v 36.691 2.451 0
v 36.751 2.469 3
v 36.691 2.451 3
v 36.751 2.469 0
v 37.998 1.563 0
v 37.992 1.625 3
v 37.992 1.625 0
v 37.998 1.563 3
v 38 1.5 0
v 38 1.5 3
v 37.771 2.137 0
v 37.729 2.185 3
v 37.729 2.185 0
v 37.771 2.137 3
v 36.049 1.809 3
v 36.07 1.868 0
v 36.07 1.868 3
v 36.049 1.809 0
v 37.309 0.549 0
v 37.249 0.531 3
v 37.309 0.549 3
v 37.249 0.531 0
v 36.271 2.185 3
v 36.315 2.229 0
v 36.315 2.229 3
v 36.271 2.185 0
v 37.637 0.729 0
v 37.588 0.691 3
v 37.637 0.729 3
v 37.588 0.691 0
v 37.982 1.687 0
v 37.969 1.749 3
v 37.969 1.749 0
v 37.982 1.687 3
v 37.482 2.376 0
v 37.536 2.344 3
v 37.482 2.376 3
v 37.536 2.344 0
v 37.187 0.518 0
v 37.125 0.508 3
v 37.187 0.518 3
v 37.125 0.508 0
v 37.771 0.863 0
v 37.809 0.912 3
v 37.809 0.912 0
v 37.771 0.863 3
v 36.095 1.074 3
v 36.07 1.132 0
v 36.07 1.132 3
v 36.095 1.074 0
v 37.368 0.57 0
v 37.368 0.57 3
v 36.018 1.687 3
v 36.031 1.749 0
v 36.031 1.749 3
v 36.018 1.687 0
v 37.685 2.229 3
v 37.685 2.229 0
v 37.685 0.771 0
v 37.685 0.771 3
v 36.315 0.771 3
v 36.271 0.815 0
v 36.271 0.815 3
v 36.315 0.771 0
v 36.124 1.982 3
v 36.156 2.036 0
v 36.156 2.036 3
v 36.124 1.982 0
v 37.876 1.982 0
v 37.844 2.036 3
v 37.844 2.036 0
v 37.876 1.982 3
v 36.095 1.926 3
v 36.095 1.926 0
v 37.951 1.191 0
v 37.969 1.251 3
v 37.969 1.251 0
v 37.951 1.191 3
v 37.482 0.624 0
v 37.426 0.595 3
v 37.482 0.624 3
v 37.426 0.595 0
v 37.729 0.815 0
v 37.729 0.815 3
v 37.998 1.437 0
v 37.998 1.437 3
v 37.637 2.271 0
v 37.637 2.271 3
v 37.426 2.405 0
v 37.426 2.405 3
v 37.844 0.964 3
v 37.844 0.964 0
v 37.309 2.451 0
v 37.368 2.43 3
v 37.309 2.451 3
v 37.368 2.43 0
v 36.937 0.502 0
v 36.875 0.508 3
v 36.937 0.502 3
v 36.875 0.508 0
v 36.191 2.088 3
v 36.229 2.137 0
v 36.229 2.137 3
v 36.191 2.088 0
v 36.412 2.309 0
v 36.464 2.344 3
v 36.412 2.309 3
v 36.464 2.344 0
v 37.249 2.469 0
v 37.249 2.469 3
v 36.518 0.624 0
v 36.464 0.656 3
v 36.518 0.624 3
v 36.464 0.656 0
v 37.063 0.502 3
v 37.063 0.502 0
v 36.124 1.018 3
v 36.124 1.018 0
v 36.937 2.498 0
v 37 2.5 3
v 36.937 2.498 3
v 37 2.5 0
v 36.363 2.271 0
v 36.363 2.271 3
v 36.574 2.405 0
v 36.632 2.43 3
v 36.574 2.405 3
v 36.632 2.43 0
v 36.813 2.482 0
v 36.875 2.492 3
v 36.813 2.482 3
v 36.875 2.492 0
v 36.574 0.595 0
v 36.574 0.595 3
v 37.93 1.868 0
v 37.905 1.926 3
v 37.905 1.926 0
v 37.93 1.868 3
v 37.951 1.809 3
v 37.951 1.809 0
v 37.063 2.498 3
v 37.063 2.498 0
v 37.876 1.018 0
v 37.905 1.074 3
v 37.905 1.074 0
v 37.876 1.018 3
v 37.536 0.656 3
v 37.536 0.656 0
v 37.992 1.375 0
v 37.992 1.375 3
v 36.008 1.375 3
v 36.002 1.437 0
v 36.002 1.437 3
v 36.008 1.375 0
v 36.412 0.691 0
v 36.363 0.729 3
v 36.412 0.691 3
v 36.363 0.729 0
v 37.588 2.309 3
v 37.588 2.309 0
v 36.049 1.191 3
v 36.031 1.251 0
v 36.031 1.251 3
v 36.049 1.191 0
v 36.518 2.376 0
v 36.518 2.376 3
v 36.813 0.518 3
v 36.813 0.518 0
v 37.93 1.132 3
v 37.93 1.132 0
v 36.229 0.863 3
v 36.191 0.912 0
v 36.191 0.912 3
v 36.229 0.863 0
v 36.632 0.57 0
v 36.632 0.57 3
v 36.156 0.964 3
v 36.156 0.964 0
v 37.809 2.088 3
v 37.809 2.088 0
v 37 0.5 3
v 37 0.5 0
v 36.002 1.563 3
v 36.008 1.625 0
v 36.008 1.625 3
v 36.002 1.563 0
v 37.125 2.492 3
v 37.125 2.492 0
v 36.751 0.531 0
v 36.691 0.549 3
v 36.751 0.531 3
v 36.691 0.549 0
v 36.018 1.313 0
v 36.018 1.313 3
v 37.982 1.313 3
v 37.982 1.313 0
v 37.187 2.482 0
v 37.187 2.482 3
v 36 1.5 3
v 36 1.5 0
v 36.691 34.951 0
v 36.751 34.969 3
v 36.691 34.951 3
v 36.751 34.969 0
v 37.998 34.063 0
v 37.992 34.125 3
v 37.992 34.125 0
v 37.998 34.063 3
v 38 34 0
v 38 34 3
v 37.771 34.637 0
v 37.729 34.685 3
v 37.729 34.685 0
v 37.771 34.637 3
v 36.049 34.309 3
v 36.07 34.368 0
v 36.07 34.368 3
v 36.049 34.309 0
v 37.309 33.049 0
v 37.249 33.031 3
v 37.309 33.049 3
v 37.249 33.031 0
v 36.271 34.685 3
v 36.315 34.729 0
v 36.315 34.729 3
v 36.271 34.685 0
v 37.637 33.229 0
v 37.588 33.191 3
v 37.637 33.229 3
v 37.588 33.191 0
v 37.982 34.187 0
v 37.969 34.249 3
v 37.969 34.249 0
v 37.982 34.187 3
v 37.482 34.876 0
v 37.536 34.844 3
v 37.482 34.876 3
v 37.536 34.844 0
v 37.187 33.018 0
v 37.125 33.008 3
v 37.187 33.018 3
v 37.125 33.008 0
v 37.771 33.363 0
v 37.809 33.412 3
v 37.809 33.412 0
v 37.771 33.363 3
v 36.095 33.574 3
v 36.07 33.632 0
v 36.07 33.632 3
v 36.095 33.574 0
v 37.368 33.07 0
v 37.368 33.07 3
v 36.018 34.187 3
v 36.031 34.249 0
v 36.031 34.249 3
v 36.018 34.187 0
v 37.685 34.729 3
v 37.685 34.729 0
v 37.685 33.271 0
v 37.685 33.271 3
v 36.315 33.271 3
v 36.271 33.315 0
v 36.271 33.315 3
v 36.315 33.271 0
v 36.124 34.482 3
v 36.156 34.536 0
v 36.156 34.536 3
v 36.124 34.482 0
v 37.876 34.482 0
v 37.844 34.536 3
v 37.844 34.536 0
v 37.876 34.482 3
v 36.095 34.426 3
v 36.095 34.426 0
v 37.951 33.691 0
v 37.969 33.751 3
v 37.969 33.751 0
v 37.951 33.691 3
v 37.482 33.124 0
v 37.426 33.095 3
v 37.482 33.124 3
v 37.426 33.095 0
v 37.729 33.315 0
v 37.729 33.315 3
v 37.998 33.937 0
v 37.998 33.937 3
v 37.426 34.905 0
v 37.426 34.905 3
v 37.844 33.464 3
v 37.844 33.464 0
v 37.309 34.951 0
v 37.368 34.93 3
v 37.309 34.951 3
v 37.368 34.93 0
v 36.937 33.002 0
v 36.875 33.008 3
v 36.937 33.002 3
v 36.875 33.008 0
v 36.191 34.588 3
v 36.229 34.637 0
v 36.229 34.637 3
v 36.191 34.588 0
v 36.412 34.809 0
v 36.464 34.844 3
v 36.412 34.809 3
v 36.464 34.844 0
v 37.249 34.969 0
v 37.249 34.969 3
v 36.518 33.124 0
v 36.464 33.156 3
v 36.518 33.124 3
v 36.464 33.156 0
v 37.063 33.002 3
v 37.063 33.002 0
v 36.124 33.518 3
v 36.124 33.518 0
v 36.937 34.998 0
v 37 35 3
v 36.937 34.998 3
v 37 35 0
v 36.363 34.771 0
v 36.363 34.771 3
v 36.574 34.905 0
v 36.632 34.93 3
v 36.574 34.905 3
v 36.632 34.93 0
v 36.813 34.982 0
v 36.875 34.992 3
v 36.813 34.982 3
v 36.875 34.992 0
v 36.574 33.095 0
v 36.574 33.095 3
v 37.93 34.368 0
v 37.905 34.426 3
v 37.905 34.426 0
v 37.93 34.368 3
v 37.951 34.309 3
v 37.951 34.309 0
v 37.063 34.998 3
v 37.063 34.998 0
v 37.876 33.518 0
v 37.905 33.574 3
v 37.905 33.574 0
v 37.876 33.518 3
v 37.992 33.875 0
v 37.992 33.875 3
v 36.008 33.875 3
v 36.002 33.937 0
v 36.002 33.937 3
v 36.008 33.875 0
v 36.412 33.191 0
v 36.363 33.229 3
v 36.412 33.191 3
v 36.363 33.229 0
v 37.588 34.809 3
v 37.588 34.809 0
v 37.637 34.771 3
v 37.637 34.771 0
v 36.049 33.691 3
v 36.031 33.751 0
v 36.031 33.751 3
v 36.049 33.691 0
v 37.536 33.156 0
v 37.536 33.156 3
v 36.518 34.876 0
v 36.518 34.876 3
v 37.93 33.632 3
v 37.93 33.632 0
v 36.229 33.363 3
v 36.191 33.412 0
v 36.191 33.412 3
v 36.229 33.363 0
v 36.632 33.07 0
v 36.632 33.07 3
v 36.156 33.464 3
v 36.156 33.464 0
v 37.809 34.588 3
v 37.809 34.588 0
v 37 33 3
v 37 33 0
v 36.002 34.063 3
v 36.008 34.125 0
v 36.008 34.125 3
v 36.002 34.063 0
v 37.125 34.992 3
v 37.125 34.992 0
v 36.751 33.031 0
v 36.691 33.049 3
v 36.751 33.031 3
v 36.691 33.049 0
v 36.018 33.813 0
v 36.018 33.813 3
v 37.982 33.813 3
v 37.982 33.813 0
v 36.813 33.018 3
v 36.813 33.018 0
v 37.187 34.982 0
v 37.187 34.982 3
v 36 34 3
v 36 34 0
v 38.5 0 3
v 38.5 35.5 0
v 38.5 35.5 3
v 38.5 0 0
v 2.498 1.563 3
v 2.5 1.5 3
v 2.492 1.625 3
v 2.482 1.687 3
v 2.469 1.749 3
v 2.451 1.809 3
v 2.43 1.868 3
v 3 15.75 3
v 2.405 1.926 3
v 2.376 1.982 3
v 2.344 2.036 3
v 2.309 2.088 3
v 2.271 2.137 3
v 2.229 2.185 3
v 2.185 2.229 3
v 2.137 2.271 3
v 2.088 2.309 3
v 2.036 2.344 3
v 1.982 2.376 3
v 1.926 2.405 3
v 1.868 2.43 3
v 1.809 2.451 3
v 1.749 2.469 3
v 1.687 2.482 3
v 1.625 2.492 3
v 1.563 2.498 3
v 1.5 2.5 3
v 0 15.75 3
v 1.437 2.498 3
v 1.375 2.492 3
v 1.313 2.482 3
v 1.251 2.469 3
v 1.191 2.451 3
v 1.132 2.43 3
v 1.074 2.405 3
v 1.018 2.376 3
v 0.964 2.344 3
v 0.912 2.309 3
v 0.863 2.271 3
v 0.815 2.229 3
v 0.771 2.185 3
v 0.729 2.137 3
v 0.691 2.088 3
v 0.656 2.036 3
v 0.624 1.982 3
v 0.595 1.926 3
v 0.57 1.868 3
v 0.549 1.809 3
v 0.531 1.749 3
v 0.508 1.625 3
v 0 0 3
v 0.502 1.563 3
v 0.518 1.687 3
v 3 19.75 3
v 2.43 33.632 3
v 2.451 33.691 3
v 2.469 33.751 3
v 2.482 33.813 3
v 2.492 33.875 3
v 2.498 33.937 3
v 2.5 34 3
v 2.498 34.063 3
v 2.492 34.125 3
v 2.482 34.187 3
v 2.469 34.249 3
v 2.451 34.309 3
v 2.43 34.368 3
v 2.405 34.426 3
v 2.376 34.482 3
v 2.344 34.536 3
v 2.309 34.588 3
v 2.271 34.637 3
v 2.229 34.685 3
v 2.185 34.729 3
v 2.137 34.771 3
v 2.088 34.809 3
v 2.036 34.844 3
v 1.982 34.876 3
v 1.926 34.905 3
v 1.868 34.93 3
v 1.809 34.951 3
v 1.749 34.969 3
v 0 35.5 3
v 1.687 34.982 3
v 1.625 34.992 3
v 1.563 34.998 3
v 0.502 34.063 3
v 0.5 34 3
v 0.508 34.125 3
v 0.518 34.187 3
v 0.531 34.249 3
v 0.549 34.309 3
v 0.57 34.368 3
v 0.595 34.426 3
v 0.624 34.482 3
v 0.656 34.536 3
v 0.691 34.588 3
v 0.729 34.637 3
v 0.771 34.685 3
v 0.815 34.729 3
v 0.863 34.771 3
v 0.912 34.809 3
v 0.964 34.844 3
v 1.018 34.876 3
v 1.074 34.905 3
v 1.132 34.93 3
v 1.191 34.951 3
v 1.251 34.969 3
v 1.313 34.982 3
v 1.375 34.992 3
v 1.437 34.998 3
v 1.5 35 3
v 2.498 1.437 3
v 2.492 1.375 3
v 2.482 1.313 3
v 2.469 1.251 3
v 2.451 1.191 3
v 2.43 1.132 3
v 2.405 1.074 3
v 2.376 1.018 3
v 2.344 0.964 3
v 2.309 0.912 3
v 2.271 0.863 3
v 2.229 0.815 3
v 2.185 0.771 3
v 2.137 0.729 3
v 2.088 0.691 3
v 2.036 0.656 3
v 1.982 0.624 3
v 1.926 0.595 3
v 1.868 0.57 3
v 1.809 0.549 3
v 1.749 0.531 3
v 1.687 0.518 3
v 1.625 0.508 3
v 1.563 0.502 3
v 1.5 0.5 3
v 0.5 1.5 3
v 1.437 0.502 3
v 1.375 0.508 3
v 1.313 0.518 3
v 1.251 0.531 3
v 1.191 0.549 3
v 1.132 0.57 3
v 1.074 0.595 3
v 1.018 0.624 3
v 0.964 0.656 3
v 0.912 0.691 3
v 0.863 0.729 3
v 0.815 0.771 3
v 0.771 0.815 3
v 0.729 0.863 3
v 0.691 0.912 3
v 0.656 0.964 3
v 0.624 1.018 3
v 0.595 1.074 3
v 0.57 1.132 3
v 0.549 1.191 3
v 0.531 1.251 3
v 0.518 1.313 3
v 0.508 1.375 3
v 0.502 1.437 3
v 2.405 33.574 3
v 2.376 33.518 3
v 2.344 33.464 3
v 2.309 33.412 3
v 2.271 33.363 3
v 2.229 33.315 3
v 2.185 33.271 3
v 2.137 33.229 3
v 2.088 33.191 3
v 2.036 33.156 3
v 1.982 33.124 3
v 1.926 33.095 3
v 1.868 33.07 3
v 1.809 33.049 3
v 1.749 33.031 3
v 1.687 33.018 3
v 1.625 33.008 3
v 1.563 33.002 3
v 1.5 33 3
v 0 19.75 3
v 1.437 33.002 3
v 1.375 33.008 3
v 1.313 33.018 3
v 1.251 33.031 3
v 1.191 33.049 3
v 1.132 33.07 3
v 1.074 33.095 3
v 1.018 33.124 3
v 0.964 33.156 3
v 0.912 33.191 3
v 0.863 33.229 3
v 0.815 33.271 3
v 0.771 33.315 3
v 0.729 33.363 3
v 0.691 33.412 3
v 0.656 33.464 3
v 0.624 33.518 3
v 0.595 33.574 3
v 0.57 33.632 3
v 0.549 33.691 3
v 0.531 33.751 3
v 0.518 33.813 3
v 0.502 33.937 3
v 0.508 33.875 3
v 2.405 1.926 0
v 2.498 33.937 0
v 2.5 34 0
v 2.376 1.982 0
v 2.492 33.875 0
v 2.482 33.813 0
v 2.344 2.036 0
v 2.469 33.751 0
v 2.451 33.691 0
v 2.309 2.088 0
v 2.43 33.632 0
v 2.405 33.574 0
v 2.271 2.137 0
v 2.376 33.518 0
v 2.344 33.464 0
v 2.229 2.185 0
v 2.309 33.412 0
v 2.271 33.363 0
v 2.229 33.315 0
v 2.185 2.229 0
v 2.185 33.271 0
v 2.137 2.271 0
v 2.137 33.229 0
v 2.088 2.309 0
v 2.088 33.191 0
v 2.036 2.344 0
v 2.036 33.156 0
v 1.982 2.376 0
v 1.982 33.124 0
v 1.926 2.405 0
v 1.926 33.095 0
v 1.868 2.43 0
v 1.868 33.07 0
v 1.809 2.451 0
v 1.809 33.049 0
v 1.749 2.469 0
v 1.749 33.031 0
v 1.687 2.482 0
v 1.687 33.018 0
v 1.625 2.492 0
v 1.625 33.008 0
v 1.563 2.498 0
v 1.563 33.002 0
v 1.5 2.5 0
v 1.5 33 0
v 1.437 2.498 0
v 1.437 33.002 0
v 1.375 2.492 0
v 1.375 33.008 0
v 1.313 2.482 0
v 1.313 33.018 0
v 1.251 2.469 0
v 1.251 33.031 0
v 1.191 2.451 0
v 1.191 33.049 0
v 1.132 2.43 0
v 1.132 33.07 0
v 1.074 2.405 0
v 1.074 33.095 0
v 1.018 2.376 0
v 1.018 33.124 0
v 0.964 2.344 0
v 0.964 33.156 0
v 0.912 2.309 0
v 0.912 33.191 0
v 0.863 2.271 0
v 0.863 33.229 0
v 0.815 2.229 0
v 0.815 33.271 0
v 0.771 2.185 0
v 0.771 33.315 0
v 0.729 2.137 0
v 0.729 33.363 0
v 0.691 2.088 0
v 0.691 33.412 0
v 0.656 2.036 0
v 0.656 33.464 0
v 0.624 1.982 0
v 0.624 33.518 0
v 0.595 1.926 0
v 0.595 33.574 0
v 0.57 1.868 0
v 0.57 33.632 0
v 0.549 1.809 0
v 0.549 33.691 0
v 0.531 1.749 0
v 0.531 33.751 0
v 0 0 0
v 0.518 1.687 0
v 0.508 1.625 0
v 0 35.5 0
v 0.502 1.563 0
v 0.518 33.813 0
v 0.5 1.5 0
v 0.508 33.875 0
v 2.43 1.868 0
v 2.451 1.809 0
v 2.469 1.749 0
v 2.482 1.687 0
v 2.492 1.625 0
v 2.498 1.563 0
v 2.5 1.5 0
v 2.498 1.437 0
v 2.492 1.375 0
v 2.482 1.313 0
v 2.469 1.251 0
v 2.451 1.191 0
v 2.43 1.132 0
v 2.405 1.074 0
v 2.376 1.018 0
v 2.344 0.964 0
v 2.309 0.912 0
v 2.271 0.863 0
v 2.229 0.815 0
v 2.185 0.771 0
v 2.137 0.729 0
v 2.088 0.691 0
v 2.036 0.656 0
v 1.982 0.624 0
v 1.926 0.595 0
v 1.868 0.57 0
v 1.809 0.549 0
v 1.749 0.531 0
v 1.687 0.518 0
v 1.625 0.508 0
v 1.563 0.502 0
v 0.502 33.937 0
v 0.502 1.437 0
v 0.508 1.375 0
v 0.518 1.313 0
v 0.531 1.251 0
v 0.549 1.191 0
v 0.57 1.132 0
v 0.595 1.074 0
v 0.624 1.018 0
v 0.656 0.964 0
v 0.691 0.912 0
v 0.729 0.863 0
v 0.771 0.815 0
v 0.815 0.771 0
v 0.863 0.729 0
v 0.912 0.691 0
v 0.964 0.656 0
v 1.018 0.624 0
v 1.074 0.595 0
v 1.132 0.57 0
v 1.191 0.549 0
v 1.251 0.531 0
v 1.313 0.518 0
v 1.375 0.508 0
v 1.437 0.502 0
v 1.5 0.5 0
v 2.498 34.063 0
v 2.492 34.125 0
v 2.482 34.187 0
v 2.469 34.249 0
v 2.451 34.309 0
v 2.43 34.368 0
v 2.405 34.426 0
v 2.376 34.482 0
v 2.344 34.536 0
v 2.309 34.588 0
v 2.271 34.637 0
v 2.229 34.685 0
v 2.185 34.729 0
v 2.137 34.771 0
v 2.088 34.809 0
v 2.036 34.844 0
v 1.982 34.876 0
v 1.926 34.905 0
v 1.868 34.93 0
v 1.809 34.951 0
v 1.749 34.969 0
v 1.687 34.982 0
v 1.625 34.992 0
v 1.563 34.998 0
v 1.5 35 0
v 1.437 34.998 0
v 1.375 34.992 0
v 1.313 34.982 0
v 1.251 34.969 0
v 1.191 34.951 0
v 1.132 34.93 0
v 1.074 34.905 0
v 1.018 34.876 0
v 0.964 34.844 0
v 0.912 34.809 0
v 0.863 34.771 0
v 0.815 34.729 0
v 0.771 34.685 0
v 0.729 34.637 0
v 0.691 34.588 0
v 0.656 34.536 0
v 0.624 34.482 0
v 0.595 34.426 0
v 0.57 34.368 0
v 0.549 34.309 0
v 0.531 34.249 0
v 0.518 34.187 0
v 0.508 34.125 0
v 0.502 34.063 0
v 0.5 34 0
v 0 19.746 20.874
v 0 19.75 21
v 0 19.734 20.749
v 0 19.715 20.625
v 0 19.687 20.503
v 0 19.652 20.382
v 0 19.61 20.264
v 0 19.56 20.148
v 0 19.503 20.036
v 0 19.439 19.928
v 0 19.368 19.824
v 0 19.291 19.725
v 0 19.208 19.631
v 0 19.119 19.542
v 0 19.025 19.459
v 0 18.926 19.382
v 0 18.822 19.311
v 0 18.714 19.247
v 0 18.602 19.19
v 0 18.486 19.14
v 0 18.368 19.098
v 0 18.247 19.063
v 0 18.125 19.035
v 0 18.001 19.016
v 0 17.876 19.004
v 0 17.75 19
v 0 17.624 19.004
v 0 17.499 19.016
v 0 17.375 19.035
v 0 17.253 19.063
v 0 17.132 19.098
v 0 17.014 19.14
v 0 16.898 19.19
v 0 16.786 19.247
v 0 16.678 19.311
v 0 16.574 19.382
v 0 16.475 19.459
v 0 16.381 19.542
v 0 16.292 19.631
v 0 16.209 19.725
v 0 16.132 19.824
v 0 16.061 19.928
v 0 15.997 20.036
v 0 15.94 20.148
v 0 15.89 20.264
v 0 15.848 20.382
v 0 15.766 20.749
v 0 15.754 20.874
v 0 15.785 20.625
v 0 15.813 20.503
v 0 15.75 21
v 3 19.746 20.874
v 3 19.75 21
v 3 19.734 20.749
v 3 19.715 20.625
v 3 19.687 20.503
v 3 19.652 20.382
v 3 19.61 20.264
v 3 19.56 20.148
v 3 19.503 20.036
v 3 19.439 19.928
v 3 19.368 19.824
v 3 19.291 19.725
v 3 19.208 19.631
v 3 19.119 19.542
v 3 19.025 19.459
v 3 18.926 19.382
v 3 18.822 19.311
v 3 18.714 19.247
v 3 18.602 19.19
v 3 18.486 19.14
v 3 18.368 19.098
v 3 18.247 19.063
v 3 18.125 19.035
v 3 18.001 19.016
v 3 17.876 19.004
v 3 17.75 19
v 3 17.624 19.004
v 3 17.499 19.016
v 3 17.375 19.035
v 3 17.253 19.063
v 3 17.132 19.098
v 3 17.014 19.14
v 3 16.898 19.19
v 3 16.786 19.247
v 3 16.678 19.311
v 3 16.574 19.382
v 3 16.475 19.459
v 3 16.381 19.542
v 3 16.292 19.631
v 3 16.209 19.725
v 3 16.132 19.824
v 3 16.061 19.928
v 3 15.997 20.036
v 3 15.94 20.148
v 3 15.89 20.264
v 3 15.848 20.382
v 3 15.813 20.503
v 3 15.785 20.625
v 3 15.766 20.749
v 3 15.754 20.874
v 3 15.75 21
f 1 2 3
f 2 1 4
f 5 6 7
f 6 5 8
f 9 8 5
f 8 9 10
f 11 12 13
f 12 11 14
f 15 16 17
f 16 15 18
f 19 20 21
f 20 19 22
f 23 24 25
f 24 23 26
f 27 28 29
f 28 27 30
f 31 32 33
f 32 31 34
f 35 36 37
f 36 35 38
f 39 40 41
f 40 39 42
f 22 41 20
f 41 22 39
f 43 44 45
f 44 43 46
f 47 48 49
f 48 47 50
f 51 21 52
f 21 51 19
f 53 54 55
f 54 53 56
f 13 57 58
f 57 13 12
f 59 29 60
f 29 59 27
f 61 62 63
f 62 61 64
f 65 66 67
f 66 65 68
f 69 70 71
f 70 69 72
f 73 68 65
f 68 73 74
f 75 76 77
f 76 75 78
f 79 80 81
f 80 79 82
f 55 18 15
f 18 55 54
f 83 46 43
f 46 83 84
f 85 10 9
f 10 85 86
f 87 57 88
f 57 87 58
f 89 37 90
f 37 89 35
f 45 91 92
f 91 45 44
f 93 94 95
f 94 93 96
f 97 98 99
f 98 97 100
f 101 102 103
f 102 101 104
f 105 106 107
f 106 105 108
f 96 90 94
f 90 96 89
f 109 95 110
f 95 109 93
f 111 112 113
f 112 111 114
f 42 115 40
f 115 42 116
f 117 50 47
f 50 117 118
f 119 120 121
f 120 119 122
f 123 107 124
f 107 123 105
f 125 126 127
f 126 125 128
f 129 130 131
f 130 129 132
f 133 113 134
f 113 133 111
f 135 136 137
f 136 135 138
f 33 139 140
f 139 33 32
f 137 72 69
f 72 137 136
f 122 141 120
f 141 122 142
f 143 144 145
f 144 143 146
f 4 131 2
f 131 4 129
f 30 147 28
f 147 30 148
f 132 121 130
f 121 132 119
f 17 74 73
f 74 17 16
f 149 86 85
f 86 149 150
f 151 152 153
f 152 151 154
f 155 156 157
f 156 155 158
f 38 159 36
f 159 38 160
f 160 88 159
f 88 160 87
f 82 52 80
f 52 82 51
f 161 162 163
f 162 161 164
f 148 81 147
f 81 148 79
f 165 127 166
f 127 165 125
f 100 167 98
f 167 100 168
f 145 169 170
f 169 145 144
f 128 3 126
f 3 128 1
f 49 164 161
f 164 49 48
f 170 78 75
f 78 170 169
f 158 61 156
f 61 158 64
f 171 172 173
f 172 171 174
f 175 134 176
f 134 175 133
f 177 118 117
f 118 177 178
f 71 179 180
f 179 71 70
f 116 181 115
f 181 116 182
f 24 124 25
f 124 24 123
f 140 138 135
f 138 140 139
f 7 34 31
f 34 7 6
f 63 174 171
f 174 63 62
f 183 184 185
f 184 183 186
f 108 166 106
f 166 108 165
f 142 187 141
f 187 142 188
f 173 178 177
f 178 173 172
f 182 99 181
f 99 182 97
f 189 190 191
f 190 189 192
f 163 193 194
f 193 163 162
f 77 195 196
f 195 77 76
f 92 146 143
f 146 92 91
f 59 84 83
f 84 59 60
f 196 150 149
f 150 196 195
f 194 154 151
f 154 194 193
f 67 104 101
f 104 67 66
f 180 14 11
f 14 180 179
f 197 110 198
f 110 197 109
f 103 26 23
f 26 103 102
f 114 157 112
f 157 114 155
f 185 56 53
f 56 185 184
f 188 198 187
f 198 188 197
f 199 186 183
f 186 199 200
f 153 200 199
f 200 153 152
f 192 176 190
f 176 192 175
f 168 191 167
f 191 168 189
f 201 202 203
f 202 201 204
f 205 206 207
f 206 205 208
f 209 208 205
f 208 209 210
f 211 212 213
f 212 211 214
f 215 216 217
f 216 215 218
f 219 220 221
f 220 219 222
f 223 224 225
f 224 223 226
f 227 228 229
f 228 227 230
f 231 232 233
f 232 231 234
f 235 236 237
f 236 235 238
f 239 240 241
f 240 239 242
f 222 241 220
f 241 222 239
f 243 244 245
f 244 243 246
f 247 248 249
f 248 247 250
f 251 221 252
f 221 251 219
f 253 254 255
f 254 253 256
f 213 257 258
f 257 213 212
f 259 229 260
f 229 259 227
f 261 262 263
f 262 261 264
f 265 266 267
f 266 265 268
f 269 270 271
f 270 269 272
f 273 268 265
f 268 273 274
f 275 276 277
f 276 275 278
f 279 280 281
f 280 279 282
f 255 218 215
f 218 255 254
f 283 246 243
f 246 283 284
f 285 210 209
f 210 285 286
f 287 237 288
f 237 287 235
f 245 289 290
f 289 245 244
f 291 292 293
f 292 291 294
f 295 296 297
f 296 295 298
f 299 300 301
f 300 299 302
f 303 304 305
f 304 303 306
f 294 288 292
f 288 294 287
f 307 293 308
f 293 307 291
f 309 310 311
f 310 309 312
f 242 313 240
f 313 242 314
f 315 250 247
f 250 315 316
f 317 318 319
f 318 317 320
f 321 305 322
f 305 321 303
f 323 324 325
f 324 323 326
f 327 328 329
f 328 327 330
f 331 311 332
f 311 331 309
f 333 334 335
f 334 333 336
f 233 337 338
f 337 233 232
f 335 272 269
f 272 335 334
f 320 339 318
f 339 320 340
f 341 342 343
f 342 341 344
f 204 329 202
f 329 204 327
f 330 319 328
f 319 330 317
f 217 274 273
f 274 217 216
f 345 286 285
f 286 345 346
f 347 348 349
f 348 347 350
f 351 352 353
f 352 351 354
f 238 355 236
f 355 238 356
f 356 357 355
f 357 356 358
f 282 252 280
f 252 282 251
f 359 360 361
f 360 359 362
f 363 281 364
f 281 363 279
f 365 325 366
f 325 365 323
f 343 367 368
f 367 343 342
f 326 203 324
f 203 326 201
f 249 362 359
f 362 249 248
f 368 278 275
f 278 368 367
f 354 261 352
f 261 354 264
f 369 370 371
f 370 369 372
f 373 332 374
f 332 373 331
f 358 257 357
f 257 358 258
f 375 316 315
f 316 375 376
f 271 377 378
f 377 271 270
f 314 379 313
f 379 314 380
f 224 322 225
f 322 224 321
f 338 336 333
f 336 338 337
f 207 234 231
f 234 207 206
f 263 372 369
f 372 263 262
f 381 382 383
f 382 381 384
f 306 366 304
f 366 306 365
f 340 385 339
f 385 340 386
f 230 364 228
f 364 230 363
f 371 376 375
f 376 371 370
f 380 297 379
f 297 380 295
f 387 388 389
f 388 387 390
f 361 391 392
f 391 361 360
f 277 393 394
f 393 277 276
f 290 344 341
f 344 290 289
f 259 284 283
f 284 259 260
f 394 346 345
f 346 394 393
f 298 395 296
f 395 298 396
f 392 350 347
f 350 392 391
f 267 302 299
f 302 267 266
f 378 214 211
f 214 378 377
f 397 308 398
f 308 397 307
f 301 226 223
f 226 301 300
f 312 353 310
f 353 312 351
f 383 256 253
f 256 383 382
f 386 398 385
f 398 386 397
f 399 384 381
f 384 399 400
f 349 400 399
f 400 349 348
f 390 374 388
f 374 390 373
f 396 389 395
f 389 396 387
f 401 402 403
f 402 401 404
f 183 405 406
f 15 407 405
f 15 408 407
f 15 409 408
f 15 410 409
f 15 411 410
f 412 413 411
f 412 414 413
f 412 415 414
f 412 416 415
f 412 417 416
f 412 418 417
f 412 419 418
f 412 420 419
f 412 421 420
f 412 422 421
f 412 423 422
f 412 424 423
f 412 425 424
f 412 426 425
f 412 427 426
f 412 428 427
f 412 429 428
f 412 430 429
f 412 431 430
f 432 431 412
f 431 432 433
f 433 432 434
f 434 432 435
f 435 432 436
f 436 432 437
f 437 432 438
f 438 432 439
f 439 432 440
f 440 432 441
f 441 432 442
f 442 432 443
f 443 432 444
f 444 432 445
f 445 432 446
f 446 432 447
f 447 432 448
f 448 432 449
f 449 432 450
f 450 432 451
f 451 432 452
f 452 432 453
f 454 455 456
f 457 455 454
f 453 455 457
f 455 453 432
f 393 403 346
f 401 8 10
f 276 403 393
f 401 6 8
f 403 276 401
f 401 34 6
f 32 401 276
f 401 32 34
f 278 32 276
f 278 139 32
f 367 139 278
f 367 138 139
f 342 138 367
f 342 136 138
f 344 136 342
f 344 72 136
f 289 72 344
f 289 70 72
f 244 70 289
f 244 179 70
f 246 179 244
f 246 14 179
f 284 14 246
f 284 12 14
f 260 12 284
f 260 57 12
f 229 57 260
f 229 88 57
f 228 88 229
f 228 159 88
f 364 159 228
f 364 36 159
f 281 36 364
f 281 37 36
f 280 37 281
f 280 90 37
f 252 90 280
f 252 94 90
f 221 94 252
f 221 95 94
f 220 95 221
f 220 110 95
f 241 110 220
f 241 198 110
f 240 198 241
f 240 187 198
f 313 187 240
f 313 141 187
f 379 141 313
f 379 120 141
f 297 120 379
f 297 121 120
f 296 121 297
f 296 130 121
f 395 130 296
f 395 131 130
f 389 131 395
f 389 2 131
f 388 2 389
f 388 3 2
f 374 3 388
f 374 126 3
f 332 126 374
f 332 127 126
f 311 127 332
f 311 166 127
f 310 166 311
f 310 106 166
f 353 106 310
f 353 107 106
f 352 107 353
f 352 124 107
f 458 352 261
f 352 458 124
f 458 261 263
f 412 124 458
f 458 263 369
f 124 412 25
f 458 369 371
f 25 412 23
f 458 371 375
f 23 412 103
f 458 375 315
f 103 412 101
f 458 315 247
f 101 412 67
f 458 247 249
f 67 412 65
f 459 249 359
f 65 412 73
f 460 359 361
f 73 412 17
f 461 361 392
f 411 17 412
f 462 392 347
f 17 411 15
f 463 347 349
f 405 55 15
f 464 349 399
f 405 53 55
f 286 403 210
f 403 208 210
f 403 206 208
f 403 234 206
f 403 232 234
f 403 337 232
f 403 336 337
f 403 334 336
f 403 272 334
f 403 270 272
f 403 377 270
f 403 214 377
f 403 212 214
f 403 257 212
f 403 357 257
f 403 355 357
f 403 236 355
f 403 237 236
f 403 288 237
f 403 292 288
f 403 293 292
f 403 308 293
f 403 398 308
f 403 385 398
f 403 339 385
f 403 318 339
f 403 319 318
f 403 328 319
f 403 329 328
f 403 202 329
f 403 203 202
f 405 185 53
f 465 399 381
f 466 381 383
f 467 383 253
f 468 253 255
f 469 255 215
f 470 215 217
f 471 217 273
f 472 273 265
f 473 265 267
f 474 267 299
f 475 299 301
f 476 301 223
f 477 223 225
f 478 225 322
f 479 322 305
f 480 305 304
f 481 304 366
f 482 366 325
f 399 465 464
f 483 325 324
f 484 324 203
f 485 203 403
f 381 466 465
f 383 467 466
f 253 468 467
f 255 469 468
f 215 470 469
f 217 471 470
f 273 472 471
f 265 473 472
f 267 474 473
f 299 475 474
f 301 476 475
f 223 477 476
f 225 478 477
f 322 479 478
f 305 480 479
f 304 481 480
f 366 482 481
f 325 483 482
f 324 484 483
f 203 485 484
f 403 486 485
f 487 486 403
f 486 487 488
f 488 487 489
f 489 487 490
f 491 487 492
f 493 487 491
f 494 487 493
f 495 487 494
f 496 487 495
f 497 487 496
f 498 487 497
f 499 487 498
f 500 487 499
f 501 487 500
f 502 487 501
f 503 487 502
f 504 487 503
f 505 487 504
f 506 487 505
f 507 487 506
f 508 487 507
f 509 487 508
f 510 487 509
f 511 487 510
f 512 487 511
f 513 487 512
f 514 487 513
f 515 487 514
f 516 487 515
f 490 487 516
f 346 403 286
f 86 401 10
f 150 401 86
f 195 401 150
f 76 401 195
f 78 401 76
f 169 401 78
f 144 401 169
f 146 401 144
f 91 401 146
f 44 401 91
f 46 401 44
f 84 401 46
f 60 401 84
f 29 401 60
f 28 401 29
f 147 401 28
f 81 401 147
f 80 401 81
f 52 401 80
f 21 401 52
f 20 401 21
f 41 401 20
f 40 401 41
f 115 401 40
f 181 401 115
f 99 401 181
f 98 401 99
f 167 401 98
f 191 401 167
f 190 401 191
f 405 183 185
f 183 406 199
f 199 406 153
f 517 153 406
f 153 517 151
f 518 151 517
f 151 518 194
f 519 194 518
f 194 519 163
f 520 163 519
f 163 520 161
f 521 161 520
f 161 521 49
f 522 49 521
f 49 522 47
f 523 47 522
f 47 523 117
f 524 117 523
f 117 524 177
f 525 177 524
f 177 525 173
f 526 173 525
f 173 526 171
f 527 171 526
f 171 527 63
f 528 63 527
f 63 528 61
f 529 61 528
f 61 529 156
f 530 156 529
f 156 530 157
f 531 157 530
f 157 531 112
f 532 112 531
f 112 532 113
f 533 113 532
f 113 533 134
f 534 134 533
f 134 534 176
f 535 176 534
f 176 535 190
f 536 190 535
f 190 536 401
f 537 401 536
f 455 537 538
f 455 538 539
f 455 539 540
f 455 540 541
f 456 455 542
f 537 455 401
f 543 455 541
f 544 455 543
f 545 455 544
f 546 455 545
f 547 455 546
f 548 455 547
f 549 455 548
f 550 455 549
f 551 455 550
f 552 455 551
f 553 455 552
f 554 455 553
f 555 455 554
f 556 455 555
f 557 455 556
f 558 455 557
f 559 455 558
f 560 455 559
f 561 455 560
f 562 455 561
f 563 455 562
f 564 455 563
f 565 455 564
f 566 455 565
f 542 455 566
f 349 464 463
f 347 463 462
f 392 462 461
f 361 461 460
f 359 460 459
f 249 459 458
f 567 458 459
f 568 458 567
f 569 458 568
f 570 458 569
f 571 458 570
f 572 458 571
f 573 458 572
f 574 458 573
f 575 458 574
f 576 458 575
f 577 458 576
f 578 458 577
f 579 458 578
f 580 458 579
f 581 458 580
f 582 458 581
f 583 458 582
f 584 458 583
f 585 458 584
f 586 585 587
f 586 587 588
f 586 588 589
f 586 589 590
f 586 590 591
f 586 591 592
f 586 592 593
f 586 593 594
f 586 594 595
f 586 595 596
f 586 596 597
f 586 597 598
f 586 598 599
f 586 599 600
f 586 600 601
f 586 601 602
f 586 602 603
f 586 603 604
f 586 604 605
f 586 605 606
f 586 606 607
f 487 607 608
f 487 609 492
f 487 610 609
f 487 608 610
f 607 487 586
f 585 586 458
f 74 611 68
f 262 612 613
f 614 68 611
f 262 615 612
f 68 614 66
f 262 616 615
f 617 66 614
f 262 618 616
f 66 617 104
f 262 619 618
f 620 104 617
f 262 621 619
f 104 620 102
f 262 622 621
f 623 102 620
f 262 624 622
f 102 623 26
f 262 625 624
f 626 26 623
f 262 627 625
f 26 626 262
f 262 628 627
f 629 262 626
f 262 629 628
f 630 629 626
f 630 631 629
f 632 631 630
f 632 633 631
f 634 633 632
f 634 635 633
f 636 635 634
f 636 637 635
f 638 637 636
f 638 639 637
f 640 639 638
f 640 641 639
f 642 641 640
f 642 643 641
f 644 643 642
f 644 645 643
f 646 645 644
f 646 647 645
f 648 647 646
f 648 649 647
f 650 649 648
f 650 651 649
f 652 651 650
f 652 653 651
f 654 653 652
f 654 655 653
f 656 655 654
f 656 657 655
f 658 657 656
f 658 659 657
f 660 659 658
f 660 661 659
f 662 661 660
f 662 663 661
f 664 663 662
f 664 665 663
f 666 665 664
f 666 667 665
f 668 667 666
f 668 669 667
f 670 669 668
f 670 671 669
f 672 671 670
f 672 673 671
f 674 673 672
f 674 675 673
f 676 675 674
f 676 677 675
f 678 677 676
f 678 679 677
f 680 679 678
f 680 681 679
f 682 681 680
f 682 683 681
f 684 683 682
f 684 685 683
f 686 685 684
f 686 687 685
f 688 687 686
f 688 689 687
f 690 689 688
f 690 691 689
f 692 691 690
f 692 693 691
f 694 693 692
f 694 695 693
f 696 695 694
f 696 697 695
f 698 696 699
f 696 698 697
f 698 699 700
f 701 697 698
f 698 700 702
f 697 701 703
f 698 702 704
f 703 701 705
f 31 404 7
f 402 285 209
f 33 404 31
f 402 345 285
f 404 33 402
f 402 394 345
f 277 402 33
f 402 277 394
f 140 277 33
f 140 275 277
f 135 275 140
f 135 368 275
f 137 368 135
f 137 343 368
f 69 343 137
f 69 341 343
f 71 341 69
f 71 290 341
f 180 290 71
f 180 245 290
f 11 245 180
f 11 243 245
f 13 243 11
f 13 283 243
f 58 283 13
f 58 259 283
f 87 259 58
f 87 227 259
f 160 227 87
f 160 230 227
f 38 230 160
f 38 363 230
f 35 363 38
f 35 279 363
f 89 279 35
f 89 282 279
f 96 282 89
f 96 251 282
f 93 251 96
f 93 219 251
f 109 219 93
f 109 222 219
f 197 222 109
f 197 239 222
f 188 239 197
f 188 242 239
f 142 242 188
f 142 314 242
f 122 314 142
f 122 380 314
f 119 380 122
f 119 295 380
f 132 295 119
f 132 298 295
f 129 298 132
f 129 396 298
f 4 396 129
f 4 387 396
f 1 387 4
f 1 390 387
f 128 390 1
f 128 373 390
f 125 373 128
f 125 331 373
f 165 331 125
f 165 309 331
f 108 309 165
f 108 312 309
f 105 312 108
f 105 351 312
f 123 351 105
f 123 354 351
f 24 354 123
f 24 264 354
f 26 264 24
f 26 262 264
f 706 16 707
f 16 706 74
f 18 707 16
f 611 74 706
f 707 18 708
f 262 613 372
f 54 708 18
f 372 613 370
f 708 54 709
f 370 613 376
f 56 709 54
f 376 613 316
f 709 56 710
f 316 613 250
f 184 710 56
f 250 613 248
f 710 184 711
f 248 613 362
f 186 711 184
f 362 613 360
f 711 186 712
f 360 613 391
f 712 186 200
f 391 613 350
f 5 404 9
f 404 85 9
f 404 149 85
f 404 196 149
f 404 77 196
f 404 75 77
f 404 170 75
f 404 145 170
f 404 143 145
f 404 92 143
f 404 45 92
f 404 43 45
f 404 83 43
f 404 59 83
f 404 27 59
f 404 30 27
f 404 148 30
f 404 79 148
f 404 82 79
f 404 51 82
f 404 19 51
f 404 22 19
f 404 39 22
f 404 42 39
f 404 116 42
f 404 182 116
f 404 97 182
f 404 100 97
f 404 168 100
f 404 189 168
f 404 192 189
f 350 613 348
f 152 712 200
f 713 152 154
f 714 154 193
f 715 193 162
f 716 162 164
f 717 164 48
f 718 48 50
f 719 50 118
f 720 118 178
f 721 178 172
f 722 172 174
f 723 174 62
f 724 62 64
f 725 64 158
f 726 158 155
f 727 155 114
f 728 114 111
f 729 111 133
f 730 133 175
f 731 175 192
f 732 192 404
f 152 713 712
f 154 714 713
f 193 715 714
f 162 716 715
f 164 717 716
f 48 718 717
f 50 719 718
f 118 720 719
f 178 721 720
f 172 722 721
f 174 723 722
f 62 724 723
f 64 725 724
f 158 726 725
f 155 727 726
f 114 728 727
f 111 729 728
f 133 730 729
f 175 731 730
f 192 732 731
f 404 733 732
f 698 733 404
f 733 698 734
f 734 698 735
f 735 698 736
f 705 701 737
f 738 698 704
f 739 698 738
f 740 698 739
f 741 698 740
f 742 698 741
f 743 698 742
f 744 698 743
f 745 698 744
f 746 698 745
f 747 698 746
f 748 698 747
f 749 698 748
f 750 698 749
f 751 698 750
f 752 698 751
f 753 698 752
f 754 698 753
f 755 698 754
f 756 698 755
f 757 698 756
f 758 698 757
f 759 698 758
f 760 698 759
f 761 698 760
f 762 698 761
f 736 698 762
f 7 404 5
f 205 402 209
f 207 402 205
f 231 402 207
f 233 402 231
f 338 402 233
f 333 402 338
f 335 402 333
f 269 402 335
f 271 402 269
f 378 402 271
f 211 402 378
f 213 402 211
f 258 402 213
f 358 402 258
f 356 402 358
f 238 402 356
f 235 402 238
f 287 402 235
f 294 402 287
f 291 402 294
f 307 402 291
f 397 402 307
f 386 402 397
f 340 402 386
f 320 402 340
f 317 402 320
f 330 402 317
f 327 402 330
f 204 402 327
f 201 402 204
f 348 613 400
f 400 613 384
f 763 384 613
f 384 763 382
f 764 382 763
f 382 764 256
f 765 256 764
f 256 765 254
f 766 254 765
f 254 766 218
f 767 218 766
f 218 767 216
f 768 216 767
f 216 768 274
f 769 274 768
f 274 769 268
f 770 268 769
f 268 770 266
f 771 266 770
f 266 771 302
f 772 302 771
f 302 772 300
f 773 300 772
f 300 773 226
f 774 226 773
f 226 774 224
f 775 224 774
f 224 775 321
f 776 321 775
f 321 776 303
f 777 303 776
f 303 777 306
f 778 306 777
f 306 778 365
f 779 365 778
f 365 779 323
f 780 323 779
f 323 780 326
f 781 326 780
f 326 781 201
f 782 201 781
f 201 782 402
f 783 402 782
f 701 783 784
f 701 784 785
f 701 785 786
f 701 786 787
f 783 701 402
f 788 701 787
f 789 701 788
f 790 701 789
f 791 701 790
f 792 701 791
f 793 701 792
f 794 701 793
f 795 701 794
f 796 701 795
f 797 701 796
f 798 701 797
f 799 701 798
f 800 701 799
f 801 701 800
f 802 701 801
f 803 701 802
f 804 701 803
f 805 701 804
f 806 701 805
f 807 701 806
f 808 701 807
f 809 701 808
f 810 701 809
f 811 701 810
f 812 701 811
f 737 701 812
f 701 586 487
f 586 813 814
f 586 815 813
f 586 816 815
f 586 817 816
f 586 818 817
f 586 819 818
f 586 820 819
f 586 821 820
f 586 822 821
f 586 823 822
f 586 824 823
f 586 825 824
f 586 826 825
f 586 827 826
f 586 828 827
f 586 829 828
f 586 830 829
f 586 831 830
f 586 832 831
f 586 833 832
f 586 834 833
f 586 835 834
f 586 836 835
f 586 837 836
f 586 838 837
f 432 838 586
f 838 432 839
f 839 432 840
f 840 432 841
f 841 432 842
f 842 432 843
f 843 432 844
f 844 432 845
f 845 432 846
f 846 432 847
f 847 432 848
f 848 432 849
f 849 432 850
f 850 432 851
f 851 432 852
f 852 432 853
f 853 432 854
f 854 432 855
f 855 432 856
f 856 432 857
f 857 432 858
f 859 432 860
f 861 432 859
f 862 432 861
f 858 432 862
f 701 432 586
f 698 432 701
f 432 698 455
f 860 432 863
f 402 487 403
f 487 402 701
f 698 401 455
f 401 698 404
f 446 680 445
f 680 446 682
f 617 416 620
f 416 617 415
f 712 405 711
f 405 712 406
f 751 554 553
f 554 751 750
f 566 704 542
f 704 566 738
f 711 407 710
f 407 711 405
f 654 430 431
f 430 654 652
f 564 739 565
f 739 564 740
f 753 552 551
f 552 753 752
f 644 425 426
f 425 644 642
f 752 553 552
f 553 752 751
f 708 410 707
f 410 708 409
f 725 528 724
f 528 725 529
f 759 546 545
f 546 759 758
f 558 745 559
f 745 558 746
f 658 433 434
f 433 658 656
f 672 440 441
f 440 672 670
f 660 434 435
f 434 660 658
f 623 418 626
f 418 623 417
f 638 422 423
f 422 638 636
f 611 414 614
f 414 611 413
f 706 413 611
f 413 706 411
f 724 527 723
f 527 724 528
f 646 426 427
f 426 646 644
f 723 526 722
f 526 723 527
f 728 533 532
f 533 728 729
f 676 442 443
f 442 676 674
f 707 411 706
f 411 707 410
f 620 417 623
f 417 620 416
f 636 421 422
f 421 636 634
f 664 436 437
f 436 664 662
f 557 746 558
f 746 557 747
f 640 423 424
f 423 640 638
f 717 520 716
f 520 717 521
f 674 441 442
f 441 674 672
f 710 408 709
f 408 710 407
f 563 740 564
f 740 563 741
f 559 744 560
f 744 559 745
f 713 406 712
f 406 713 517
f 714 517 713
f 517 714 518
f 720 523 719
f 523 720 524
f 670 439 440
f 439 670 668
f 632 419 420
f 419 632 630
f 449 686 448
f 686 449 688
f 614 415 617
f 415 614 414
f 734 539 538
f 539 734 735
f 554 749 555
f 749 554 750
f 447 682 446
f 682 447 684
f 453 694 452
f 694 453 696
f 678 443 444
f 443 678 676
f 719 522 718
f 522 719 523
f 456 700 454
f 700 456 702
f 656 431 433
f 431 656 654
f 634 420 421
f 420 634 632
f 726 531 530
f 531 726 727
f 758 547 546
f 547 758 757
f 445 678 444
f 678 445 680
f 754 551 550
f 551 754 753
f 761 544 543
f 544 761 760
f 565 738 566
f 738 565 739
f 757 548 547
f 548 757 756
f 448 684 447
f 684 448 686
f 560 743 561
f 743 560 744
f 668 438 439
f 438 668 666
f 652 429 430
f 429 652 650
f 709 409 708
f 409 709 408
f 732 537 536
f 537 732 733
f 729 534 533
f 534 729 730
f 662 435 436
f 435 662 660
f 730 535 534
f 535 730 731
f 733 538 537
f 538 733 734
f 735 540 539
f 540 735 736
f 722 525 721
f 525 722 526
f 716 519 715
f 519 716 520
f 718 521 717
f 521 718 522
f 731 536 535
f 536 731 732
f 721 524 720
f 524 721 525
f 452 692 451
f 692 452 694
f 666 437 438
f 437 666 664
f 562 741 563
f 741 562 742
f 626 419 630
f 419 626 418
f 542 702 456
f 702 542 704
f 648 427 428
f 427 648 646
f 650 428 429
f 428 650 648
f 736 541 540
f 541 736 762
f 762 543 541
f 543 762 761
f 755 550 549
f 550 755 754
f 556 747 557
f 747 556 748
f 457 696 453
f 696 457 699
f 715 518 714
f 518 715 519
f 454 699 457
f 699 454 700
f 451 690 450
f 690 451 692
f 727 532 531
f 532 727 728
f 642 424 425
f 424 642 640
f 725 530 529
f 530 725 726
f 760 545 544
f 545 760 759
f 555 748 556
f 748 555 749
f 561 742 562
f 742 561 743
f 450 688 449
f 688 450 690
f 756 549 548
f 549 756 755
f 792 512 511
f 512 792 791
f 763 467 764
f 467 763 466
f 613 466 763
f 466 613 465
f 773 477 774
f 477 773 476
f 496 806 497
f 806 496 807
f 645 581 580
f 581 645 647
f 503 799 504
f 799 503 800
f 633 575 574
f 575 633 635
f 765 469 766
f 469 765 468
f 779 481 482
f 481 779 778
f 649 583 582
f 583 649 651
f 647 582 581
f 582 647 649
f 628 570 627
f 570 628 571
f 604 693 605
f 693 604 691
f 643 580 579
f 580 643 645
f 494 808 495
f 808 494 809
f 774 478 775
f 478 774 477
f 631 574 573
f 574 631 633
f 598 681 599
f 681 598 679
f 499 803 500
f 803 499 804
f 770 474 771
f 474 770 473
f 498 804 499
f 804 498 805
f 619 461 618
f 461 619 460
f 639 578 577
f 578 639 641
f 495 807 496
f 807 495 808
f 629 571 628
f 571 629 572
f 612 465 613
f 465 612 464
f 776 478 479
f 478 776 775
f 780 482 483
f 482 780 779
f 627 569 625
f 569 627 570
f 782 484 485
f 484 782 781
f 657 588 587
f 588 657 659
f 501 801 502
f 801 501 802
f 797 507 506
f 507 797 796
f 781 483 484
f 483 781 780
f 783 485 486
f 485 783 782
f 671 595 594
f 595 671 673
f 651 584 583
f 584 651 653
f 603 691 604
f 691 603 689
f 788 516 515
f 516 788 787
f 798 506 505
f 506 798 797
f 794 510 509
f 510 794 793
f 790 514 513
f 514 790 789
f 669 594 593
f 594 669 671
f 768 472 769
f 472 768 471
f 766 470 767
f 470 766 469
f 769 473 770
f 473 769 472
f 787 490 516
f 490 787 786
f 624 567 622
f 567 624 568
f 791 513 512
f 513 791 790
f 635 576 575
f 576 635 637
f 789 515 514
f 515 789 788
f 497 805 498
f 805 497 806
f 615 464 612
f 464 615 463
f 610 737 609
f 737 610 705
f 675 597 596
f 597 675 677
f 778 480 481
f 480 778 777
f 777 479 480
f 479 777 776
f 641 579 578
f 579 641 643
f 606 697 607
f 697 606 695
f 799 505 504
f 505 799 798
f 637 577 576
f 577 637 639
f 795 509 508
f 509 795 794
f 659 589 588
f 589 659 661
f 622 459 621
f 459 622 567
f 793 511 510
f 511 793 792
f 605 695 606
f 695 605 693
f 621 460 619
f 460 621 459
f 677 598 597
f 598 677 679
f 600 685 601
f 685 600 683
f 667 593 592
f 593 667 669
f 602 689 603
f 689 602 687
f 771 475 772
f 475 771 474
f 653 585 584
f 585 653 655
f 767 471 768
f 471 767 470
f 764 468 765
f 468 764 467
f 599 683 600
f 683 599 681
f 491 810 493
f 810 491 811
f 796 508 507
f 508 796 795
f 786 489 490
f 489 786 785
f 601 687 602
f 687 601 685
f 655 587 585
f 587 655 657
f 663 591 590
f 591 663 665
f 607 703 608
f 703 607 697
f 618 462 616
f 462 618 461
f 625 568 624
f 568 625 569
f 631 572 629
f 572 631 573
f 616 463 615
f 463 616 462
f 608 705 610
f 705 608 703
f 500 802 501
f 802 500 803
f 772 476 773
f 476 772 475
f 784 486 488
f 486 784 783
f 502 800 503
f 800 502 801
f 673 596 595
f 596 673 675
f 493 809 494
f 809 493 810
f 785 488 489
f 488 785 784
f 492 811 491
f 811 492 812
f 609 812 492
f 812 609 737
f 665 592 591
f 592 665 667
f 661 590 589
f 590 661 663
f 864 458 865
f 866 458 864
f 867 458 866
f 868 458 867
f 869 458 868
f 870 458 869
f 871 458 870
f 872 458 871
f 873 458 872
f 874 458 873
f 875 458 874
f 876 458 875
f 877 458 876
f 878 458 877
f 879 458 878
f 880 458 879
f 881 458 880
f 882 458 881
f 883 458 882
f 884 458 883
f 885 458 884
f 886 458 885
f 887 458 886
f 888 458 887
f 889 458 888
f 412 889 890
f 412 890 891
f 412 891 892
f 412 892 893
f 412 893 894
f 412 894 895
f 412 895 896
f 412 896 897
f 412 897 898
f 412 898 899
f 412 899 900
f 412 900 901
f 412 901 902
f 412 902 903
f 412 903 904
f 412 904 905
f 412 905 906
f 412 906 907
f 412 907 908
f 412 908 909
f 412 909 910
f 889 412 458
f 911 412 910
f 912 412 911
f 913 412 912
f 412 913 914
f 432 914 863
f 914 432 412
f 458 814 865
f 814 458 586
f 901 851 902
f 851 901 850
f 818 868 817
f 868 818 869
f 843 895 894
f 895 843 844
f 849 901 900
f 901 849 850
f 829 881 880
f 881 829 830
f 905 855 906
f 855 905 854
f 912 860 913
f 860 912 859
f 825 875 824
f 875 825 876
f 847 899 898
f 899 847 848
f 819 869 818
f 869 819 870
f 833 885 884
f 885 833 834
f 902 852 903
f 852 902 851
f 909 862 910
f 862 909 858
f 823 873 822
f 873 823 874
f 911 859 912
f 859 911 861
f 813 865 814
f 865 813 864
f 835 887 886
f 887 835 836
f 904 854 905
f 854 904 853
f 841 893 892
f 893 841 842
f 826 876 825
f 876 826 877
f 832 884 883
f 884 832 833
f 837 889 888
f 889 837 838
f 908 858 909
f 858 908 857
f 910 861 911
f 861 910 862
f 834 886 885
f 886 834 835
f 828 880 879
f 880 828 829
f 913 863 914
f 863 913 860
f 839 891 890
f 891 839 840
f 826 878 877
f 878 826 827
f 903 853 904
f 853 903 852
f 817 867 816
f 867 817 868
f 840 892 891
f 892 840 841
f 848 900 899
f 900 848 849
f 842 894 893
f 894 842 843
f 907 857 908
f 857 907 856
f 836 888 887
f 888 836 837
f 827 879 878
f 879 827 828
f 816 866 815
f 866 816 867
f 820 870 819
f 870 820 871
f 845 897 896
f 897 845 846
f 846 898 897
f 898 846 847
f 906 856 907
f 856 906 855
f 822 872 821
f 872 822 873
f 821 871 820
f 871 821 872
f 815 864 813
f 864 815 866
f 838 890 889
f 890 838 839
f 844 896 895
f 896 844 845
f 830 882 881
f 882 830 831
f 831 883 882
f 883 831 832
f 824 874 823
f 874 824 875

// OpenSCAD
/* 
 * Copyright (C) 2015  TELECOM Nancy
 *
 * This model is under the Creative Common CC-BY-SA-NC license.
 *
 */

boardLength             = 22.5;
boardWidth              = 19.5;
boardHeight             = 4.5;

boardGap                = 5;

screwHoleDiam           = 3;
screwSpaceFromEdge      = 1;
screwEp                 = 2;
screwDiam               = 2;

fixationLength          = 20;

epaisseur               = 3;
hauteurBoite            = 25;
filDiam                 = 4;


elevationCarte          = hauteurBoite - boardGap - epaisseur;
baseLength              = boardLength + 2 * (boardGap + epaisseur);
baseWidth               = boardWidth + 2 * (boardGap + epaisseur);

screwCylDiff            = epaisseur + boardGap + screwSpaceFromEdge + screwHoleDiam/2;

diamVisFix              = 4;
diamVisCouv             = 2;

fn = 100;

difference() {
    
    cube(size = [baseLength, baseWidth,  epaisseur]);
    translate([epaisseur/2, epaisseur / 2, -0.1])
            cylinder(h = epaisseur + 0.2, d = diamVisCouv, $fn = fn);
    
    translate([epaisseur/2, baseWidth - epaisseur / 2, -0.1])
           cylinder(h = epaisseur + 0.2, d = diamVisCouv, $fn = fn);
    
    translate([baseLength - epaisseur, 0, 0]) {
        translate([epaisseur/2, epaisseur / 2, -0.1])
            cylinder(h = epaisseur + 0.2, d = diamVisCouv, $fn = fn);
    
        translate([epaisseur/2, baseWidth - epaisseur / 2, -0.1])
                cylinder(h = epaisseur + 0.2, d = diamVisCouv, $fn = fn);
    }
    
}
    
translate([0, baseWidth / 2, hauteurBoite - filDiam])
    rotate([180, 0, 0])
        difference() {
            translate([0, -filDiam / 2, 0])
                cube(size = [epaisseur, filDiam, hauteurBoite - epaisseur - filDiam]);
            translate([-0.1,0,0])
            rotate([0, 90, 0])
                cylinder(h = epaisseur + 0.2, d = filDiam, $fn = fn);
            
        }
        
